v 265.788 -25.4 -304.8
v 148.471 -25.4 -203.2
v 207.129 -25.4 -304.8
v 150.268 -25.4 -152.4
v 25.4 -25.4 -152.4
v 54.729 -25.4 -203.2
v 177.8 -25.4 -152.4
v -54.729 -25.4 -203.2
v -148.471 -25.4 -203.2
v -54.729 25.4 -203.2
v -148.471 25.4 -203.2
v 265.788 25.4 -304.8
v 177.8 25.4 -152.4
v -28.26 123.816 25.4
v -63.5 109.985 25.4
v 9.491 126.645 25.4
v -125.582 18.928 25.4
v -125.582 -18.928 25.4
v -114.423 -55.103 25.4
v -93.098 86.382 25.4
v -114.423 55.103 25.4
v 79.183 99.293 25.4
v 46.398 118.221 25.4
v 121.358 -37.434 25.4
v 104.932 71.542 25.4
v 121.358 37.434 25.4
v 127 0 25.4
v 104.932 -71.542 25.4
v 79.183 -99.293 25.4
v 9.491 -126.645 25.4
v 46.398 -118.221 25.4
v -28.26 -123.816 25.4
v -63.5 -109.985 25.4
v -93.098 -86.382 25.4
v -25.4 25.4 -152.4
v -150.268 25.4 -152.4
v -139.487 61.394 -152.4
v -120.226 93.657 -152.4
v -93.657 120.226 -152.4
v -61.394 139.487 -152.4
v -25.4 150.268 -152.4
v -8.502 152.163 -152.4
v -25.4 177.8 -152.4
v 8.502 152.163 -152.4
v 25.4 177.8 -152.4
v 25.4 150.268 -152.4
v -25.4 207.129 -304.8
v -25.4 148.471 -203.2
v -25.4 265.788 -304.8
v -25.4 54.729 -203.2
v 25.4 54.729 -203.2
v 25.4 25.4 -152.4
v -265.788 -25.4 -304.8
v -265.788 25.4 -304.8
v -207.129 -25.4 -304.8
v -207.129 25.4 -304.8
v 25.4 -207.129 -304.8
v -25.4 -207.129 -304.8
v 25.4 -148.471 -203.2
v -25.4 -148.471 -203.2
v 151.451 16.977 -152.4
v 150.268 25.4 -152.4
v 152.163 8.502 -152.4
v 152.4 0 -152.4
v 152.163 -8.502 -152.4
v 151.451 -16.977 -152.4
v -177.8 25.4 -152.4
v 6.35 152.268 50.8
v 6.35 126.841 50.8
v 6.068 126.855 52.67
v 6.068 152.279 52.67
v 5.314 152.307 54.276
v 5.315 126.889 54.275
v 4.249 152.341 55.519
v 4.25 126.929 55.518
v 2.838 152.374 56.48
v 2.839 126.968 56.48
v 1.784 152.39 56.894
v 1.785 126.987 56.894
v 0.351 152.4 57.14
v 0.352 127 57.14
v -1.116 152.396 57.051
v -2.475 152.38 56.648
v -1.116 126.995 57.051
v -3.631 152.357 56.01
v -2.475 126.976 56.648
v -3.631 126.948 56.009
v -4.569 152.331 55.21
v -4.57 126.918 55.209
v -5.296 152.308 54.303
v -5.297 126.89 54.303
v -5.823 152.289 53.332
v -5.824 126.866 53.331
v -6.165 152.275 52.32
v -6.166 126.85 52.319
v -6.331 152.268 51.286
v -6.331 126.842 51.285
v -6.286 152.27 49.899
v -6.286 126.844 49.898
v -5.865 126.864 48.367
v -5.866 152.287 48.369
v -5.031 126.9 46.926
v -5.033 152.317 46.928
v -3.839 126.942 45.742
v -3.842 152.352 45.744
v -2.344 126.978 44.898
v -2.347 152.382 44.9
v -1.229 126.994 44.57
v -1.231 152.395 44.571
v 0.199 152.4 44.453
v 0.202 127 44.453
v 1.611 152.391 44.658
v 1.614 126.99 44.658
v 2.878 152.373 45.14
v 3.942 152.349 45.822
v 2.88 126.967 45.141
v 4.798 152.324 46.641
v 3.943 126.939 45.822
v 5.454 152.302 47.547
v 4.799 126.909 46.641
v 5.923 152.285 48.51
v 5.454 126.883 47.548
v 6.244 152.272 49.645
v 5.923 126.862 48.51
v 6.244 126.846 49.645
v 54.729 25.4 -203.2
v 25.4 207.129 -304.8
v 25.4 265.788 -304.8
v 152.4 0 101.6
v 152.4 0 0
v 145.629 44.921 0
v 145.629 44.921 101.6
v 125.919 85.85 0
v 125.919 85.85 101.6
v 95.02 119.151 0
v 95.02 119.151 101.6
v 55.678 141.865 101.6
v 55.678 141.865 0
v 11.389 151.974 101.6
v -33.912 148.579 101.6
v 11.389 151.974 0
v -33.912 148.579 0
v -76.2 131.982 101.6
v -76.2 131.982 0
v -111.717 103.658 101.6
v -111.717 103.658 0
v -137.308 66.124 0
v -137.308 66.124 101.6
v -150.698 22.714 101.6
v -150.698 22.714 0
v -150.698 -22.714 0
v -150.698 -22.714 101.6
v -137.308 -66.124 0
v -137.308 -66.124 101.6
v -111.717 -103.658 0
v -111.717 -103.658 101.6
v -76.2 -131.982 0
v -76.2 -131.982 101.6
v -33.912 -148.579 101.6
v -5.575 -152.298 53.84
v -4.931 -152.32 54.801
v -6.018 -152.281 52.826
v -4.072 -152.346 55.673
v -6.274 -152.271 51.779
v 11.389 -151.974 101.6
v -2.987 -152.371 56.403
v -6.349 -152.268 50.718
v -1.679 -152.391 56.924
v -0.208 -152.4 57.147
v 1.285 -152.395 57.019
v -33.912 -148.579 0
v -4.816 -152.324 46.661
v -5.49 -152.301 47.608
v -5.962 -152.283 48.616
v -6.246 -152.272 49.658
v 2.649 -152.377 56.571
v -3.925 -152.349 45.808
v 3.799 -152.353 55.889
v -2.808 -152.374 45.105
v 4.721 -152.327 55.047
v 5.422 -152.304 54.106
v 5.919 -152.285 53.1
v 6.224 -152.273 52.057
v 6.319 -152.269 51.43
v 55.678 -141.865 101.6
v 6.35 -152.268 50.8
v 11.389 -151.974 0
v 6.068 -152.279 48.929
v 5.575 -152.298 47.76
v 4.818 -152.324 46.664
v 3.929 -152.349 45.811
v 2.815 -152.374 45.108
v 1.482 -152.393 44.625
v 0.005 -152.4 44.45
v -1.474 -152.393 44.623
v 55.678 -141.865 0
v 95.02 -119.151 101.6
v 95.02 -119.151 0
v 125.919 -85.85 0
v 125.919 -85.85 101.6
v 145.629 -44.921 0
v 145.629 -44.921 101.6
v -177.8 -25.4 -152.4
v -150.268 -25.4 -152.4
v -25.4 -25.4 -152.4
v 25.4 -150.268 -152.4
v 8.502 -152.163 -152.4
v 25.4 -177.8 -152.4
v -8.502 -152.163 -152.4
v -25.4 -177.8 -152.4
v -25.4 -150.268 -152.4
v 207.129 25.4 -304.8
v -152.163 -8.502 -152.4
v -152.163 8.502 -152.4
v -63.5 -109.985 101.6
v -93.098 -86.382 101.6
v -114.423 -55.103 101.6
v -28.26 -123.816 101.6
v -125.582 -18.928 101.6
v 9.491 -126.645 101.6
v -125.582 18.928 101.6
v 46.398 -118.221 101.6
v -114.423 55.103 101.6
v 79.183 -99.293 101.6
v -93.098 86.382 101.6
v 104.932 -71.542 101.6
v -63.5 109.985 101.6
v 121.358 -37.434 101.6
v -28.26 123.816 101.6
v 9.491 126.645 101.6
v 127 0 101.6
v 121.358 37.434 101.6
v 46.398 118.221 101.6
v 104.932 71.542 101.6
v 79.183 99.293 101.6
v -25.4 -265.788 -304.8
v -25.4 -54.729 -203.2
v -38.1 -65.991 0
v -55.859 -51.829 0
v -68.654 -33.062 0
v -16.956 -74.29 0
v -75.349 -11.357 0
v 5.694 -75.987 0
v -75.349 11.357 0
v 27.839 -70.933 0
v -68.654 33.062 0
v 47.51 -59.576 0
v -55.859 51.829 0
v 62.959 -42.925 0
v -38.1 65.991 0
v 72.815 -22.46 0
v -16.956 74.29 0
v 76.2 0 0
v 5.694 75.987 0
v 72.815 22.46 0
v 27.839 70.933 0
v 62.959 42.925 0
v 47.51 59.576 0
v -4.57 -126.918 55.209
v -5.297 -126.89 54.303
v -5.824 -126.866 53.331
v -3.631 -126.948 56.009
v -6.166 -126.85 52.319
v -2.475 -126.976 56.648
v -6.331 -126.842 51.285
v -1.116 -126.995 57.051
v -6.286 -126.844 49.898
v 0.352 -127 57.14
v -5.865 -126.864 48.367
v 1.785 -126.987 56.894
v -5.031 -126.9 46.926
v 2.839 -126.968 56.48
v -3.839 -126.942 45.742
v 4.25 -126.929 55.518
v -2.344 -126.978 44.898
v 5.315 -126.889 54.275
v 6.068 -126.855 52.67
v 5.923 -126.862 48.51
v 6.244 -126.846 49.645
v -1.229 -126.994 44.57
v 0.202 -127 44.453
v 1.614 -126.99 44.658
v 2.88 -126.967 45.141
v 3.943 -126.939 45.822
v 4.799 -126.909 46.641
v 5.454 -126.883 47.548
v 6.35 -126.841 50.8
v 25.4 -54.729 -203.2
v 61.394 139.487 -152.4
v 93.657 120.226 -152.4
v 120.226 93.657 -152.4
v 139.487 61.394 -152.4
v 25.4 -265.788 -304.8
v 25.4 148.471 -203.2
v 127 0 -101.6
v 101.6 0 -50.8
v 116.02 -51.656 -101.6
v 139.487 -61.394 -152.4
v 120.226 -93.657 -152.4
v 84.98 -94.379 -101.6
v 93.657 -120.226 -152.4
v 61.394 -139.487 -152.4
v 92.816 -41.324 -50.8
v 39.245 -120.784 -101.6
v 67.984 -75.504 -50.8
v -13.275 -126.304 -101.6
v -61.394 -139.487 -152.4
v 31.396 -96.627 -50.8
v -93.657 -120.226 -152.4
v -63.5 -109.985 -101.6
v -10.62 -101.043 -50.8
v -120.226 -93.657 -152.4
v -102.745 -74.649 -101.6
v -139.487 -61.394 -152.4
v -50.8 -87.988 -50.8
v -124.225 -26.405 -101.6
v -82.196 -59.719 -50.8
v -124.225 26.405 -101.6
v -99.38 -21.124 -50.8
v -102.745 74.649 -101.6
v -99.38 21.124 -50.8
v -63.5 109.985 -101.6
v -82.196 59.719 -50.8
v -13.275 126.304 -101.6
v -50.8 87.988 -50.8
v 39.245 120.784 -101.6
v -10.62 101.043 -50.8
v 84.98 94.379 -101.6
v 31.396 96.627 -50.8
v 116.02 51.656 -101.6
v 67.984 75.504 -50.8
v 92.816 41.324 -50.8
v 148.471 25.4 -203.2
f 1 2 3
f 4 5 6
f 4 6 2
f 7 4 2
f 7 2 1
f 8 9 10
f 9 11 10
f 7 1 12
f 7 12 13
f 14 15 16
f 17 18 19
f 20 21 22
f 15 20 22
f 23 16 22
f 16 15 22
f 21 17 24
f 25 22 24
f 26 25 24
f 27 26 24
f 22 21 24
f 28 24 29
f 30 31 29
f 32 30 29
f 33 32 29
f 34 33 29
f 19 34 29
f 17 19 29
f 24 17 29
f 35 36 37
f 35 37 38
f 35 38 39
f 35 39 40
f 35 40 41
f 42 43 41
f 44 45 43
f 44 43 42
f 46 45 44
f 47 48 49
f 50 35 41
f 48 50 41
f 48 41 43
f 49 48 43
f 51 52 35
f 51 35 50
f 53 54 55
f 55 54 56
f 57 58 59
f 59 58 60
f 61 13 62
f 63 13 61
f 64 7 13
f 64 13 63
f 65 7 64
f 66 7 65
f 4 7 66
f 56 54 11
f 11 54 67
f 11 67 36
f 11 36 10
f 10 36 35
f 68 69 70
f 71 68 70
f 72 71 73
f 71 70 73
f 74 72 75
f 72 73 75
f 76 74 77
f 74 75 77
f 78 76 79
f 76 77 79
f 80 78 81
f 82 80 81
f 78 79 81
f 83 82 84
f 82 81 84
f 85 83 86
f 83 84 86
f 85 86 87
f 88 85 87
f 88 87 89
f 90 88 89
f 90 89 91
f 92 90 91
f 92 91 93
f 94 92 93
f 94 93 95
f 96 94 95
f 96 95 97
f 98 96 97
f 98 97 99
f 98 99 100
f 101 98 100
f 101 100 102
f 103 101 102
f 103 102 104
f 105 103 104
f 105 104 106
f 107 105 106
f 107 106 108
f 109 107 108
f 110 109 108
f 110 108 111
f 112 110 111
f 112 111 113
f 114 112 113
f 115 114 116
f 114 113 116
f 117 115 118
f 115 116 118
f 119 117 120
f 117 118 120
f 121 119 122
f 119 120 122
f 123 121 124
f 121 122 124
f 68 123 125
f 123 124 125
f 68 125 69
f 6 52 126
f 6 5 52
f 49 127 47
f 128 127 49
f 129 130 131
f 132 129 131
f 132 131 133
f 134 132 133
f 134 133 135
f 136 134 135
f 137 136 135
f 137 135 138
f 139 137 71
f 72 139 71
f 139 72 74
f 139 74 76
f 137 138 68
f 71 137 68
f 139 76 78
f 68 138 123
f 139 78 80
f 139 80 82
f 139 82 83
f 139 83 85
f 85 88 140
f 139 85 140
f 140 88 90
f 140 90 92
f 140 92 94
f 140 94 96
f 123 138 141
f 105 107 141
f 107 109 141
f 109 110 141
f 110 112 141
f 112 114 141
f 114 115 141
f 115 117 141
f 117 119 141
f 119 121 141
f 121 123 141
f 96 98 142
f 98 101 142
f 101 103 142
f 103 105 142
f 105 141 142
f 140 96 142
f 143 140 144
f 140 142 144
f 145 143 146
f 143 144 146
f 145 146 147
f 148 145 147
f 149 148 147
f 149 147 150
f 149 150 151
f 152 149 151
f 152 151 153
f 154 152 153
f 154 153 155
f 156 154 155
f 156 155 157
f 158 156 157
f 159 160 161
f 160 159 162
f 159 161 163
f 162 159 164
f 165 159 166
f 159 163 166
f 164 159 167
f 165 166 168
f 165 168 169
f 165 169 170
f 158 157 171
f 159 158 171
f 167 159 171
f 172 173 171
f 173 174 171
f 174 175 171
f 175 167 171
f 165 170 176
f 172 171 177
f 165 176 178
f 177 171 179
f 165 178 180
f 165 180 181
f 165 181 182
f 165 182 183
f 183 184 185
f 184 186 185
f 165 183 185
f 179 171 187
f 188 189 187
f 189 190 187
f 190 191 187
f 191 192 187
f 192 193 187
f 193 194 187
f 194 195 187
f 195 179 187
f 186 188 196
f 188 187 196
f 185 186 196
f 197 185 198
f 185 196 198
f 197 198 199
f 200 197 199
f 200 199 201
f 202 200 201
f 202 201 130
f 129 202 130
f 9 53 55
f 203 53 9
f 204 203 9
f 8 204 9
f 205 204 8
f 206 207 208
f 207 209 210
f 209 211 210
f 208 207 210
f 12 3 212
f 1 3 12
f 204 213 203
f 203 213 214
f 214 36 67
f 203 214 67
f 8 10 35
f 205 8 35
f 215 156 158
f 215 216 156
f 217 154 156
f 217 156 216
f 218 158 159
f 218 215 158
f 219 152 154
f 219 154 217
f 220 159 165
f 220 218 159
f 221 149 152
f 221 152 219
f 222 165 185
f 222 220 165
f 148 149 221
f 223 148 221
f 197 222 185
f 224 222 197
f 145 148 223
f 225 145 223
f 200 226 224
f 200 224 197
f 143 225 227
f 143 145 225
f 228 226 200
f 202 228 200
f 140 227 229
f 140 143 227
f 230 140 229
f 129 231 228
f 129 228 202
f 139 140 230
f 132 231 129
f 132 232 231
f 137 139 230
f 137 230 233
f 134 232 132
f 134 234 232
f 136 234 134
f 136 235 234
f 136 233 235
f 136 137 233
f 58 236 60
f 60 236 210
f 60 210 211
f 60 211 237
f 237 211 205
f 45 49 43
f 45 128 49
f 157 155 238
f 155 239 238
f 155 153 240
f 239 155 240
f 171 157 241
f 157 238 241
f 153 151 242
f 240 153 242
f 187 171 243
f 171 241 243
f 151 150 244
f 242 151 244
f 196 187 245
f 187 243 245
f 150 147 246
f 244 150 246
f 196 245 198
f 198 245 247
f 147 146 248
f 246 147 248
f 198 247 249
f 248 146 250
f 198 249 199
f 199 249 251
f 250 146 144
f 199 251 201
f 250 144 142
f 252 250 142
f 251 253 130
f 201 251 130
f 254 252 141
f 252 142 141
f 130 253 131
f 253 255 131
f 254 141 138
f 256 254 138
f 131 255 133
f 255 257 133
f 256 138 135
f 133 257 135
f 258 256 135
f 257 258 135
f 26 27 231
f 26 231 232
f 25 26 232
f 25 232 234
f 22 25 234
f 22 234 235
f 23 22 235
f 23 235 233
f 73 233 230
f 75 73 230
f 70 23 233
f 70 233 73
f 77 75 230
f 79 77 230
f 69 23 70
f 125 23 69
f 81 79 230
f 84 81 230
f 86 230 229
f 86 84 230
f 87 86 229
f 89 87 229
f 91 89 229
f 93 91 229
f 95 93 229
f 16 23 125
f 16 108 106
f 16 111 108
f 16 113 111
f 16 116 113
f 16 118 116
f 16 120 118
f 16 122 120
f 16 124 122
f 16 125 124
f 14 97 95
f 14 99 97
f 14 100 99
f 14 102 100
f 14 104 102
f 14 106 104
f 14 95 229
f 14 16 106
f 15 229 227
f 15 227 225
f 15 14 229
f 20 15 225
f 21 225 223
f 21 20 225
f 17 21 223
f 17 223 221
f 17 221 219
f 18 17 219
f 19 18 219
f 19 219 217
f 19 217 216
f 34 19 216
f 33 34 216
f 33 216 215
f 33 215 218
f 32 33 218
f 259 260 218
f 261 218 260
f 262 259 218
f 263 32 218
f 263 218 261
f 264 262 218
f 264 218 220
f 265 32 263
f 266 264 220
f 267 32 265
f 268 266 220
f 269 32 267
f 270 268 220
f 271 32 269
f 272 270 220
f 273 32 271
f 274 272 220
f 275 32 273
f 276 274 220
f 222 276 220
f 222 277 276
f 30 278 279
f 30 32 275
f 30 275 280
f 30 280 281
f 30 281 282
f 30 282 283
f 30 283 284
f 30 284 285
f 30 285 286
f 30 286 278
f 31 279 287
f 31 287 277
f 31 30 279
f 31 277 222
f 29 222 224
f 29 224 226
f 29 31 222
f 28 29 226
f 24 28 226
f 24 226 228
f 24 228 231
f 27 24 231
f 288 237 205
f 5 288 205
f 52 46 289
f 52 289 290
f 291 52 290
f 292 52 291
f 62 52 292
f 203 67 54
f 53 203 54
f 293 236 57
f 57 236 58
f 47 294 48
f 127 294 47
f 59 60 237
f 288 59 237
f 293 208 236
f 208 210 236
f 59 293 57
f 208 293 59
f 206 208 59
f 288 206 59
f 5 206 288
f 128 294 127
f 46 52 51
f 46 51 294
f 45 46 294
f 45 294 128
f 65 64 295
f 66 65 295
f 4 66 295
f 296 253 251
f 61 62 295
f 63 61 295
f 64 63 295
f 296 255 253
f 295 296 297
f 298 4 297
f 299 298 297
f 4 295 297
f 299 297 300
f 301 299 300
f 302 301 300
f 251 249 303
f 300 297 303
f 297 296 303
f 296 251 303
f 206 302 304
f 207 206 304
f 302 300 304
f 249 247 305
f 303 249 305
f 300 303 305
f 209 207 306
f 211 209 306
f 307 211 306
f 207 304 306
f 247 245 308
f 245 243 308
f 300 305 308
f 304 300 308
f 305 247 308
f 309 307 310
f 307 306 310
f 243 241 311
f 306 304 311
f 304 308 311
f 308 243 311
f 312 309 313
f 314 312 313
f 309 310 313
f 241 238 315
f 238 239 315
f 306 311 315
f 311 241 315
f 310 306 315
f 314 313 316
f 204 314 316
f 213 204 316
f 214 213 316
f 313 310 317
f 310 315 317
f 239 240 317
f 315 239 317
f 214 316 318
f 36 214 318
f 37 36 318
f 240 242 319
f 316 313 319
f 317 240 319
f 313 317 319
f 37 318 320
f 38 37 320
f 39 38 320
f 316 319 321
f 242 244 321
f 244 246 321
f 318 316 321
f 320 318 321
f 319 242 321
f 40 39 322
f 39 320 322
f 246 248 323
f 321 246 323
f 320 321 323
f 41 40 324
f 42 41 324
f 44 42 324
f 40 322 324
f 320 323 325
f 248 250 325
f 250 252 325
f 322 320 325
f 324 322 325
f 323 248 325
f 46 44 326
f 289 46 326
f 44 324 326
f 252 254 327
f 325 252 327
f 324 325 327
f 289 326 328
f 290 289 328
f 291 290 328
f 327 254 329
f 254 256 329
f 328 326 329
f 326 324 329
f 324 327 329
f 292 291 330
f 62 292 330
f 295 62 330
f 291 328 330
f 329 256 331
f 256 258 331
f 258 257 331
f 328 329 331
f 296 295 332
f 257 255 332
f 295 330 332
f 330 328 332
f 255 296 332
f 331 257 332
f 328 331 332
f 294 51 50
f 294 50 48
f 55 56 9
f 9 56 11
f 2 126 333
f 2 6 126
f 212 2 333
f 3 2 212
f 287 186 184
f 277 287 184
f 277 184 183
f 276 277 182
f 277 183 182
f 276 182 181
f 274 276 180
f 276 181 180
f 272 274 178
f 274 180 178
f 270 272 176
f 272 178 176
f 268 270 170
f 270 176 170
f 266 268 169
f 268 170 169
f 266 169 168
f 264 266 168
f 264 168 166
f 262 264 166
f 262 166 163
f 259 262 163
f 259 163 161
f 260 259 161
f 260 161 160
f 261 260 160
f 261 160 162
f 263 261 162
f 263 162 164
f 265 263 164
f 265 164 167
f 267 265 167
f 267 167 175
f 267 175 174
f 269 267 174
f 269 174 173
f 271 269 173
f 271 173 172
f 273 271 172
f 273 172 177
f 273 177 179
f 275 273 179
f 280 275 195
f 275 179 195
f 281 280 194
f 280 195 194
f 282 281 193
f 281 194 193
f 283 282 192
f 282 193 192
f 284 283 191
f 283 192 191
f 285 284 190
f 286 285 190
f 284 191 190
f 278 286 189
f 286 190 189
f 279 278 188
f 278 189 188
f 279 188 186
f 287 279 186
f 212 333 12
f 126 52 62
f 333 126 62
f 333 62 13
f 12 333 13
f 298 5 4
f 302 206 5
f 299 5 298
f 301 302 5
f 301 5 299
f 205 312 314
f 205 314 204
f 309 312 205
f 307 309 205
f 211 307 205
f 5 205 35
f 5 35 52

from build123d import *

# Parameters (mm, degrees)
F0_R      = 152.4
F0_R_2    = 127
F1_DEPTH  = 101.6
F2_R      = 127.018603898
F3_DEPTH  = 25.4
F5_R      = 6.35
F6_DEPTH  = 304.801
F9_R      = 152.4
F7_R      = 76.2
F13_DEPTH = 25.4
F15_DEPTH = 25.4


with BuildPart() as f1:
    # F0 (on Top) → F1 (new body)
    with BuildSketch(Plane.XY):
        Circle(F0_R)
        Circle(F0_R_2, mode=Mode.SUBTRACT)
    extrude(amount=F1_DEPTH)

    # F2 (on face) → F3 (join)
    with BuildSketch(Plane(origin=(0, 0, 0), x_dir=(1, 0, 0), z_dir=(0, 0, -1))):
        Circle(F2_R)
    extrude(amount=-F3_DEPTH)

    # F5 (on offset) → F6 (cut, through all)
    with BuildSketch(Plane.XZ.offset(152.4)):
        with Locations((0, 50.8)):
            Circle(F5_R)
    extrude(amount=-F6_DEPTH, mode=Mode.SUBTRACT)

    # F9 (on offset) → F10 section 0
    with BuildSketch(Plane(origin=(0, 0, -152.4), x_dir=(1, 0, 0), z_dir=(0, 0, -1))):
        Circle(F9_R)
    # F7 (on face) → F10 section 1
    with BuildSketch(Plane(origin=(0, 0, 0), x_dir=(1, 0, 0), z_dir=(0, 0, -1))):
        Circle(F7_R)
    loft()

    # F12 (on Front) → F13 (join, symmetric)
    with BuildSketch(Plane.XZ):
        Polygon((-177.8, -152.4), (-265.7881810245, -304.8), (-207.1293936748, -304.8), (-148.4706063252, -203.2), (-54.7293936748, -203.2), (-25.4, -152.4), align=None)
        Polygon((148.4706063252, -203.2), (207.1293936748, -304.8), (265.7881810245, -304.8), (177.8, -152.4), (25.4, -152.4), (54.7293936748, -203.2), align=None)
    extrude(amount=F13_DEPTH, both=True)

    # F14 (on Right) → F15 (join, symmetric)
    with BuildSketch(Plane.YZ):
        Polygon((-25.4, -152.4), (-177.8, -152.4), (-265.7881810245, -304.8), (-207.1293936748, -304.8), (-148.4706063252, -203.2), (-54.7293936748, -203.2), align=None)
        Polygon((265.7881810245, -304.8), (177.8, -152.4), (25.4, -152.4), (54.7293936748, -203.2), (148.4706063252, -203.2), (207.1293936748, -304.8), align=None)
    extrude(amount=F15_DEPTH, both=True)


solid = f1.part
